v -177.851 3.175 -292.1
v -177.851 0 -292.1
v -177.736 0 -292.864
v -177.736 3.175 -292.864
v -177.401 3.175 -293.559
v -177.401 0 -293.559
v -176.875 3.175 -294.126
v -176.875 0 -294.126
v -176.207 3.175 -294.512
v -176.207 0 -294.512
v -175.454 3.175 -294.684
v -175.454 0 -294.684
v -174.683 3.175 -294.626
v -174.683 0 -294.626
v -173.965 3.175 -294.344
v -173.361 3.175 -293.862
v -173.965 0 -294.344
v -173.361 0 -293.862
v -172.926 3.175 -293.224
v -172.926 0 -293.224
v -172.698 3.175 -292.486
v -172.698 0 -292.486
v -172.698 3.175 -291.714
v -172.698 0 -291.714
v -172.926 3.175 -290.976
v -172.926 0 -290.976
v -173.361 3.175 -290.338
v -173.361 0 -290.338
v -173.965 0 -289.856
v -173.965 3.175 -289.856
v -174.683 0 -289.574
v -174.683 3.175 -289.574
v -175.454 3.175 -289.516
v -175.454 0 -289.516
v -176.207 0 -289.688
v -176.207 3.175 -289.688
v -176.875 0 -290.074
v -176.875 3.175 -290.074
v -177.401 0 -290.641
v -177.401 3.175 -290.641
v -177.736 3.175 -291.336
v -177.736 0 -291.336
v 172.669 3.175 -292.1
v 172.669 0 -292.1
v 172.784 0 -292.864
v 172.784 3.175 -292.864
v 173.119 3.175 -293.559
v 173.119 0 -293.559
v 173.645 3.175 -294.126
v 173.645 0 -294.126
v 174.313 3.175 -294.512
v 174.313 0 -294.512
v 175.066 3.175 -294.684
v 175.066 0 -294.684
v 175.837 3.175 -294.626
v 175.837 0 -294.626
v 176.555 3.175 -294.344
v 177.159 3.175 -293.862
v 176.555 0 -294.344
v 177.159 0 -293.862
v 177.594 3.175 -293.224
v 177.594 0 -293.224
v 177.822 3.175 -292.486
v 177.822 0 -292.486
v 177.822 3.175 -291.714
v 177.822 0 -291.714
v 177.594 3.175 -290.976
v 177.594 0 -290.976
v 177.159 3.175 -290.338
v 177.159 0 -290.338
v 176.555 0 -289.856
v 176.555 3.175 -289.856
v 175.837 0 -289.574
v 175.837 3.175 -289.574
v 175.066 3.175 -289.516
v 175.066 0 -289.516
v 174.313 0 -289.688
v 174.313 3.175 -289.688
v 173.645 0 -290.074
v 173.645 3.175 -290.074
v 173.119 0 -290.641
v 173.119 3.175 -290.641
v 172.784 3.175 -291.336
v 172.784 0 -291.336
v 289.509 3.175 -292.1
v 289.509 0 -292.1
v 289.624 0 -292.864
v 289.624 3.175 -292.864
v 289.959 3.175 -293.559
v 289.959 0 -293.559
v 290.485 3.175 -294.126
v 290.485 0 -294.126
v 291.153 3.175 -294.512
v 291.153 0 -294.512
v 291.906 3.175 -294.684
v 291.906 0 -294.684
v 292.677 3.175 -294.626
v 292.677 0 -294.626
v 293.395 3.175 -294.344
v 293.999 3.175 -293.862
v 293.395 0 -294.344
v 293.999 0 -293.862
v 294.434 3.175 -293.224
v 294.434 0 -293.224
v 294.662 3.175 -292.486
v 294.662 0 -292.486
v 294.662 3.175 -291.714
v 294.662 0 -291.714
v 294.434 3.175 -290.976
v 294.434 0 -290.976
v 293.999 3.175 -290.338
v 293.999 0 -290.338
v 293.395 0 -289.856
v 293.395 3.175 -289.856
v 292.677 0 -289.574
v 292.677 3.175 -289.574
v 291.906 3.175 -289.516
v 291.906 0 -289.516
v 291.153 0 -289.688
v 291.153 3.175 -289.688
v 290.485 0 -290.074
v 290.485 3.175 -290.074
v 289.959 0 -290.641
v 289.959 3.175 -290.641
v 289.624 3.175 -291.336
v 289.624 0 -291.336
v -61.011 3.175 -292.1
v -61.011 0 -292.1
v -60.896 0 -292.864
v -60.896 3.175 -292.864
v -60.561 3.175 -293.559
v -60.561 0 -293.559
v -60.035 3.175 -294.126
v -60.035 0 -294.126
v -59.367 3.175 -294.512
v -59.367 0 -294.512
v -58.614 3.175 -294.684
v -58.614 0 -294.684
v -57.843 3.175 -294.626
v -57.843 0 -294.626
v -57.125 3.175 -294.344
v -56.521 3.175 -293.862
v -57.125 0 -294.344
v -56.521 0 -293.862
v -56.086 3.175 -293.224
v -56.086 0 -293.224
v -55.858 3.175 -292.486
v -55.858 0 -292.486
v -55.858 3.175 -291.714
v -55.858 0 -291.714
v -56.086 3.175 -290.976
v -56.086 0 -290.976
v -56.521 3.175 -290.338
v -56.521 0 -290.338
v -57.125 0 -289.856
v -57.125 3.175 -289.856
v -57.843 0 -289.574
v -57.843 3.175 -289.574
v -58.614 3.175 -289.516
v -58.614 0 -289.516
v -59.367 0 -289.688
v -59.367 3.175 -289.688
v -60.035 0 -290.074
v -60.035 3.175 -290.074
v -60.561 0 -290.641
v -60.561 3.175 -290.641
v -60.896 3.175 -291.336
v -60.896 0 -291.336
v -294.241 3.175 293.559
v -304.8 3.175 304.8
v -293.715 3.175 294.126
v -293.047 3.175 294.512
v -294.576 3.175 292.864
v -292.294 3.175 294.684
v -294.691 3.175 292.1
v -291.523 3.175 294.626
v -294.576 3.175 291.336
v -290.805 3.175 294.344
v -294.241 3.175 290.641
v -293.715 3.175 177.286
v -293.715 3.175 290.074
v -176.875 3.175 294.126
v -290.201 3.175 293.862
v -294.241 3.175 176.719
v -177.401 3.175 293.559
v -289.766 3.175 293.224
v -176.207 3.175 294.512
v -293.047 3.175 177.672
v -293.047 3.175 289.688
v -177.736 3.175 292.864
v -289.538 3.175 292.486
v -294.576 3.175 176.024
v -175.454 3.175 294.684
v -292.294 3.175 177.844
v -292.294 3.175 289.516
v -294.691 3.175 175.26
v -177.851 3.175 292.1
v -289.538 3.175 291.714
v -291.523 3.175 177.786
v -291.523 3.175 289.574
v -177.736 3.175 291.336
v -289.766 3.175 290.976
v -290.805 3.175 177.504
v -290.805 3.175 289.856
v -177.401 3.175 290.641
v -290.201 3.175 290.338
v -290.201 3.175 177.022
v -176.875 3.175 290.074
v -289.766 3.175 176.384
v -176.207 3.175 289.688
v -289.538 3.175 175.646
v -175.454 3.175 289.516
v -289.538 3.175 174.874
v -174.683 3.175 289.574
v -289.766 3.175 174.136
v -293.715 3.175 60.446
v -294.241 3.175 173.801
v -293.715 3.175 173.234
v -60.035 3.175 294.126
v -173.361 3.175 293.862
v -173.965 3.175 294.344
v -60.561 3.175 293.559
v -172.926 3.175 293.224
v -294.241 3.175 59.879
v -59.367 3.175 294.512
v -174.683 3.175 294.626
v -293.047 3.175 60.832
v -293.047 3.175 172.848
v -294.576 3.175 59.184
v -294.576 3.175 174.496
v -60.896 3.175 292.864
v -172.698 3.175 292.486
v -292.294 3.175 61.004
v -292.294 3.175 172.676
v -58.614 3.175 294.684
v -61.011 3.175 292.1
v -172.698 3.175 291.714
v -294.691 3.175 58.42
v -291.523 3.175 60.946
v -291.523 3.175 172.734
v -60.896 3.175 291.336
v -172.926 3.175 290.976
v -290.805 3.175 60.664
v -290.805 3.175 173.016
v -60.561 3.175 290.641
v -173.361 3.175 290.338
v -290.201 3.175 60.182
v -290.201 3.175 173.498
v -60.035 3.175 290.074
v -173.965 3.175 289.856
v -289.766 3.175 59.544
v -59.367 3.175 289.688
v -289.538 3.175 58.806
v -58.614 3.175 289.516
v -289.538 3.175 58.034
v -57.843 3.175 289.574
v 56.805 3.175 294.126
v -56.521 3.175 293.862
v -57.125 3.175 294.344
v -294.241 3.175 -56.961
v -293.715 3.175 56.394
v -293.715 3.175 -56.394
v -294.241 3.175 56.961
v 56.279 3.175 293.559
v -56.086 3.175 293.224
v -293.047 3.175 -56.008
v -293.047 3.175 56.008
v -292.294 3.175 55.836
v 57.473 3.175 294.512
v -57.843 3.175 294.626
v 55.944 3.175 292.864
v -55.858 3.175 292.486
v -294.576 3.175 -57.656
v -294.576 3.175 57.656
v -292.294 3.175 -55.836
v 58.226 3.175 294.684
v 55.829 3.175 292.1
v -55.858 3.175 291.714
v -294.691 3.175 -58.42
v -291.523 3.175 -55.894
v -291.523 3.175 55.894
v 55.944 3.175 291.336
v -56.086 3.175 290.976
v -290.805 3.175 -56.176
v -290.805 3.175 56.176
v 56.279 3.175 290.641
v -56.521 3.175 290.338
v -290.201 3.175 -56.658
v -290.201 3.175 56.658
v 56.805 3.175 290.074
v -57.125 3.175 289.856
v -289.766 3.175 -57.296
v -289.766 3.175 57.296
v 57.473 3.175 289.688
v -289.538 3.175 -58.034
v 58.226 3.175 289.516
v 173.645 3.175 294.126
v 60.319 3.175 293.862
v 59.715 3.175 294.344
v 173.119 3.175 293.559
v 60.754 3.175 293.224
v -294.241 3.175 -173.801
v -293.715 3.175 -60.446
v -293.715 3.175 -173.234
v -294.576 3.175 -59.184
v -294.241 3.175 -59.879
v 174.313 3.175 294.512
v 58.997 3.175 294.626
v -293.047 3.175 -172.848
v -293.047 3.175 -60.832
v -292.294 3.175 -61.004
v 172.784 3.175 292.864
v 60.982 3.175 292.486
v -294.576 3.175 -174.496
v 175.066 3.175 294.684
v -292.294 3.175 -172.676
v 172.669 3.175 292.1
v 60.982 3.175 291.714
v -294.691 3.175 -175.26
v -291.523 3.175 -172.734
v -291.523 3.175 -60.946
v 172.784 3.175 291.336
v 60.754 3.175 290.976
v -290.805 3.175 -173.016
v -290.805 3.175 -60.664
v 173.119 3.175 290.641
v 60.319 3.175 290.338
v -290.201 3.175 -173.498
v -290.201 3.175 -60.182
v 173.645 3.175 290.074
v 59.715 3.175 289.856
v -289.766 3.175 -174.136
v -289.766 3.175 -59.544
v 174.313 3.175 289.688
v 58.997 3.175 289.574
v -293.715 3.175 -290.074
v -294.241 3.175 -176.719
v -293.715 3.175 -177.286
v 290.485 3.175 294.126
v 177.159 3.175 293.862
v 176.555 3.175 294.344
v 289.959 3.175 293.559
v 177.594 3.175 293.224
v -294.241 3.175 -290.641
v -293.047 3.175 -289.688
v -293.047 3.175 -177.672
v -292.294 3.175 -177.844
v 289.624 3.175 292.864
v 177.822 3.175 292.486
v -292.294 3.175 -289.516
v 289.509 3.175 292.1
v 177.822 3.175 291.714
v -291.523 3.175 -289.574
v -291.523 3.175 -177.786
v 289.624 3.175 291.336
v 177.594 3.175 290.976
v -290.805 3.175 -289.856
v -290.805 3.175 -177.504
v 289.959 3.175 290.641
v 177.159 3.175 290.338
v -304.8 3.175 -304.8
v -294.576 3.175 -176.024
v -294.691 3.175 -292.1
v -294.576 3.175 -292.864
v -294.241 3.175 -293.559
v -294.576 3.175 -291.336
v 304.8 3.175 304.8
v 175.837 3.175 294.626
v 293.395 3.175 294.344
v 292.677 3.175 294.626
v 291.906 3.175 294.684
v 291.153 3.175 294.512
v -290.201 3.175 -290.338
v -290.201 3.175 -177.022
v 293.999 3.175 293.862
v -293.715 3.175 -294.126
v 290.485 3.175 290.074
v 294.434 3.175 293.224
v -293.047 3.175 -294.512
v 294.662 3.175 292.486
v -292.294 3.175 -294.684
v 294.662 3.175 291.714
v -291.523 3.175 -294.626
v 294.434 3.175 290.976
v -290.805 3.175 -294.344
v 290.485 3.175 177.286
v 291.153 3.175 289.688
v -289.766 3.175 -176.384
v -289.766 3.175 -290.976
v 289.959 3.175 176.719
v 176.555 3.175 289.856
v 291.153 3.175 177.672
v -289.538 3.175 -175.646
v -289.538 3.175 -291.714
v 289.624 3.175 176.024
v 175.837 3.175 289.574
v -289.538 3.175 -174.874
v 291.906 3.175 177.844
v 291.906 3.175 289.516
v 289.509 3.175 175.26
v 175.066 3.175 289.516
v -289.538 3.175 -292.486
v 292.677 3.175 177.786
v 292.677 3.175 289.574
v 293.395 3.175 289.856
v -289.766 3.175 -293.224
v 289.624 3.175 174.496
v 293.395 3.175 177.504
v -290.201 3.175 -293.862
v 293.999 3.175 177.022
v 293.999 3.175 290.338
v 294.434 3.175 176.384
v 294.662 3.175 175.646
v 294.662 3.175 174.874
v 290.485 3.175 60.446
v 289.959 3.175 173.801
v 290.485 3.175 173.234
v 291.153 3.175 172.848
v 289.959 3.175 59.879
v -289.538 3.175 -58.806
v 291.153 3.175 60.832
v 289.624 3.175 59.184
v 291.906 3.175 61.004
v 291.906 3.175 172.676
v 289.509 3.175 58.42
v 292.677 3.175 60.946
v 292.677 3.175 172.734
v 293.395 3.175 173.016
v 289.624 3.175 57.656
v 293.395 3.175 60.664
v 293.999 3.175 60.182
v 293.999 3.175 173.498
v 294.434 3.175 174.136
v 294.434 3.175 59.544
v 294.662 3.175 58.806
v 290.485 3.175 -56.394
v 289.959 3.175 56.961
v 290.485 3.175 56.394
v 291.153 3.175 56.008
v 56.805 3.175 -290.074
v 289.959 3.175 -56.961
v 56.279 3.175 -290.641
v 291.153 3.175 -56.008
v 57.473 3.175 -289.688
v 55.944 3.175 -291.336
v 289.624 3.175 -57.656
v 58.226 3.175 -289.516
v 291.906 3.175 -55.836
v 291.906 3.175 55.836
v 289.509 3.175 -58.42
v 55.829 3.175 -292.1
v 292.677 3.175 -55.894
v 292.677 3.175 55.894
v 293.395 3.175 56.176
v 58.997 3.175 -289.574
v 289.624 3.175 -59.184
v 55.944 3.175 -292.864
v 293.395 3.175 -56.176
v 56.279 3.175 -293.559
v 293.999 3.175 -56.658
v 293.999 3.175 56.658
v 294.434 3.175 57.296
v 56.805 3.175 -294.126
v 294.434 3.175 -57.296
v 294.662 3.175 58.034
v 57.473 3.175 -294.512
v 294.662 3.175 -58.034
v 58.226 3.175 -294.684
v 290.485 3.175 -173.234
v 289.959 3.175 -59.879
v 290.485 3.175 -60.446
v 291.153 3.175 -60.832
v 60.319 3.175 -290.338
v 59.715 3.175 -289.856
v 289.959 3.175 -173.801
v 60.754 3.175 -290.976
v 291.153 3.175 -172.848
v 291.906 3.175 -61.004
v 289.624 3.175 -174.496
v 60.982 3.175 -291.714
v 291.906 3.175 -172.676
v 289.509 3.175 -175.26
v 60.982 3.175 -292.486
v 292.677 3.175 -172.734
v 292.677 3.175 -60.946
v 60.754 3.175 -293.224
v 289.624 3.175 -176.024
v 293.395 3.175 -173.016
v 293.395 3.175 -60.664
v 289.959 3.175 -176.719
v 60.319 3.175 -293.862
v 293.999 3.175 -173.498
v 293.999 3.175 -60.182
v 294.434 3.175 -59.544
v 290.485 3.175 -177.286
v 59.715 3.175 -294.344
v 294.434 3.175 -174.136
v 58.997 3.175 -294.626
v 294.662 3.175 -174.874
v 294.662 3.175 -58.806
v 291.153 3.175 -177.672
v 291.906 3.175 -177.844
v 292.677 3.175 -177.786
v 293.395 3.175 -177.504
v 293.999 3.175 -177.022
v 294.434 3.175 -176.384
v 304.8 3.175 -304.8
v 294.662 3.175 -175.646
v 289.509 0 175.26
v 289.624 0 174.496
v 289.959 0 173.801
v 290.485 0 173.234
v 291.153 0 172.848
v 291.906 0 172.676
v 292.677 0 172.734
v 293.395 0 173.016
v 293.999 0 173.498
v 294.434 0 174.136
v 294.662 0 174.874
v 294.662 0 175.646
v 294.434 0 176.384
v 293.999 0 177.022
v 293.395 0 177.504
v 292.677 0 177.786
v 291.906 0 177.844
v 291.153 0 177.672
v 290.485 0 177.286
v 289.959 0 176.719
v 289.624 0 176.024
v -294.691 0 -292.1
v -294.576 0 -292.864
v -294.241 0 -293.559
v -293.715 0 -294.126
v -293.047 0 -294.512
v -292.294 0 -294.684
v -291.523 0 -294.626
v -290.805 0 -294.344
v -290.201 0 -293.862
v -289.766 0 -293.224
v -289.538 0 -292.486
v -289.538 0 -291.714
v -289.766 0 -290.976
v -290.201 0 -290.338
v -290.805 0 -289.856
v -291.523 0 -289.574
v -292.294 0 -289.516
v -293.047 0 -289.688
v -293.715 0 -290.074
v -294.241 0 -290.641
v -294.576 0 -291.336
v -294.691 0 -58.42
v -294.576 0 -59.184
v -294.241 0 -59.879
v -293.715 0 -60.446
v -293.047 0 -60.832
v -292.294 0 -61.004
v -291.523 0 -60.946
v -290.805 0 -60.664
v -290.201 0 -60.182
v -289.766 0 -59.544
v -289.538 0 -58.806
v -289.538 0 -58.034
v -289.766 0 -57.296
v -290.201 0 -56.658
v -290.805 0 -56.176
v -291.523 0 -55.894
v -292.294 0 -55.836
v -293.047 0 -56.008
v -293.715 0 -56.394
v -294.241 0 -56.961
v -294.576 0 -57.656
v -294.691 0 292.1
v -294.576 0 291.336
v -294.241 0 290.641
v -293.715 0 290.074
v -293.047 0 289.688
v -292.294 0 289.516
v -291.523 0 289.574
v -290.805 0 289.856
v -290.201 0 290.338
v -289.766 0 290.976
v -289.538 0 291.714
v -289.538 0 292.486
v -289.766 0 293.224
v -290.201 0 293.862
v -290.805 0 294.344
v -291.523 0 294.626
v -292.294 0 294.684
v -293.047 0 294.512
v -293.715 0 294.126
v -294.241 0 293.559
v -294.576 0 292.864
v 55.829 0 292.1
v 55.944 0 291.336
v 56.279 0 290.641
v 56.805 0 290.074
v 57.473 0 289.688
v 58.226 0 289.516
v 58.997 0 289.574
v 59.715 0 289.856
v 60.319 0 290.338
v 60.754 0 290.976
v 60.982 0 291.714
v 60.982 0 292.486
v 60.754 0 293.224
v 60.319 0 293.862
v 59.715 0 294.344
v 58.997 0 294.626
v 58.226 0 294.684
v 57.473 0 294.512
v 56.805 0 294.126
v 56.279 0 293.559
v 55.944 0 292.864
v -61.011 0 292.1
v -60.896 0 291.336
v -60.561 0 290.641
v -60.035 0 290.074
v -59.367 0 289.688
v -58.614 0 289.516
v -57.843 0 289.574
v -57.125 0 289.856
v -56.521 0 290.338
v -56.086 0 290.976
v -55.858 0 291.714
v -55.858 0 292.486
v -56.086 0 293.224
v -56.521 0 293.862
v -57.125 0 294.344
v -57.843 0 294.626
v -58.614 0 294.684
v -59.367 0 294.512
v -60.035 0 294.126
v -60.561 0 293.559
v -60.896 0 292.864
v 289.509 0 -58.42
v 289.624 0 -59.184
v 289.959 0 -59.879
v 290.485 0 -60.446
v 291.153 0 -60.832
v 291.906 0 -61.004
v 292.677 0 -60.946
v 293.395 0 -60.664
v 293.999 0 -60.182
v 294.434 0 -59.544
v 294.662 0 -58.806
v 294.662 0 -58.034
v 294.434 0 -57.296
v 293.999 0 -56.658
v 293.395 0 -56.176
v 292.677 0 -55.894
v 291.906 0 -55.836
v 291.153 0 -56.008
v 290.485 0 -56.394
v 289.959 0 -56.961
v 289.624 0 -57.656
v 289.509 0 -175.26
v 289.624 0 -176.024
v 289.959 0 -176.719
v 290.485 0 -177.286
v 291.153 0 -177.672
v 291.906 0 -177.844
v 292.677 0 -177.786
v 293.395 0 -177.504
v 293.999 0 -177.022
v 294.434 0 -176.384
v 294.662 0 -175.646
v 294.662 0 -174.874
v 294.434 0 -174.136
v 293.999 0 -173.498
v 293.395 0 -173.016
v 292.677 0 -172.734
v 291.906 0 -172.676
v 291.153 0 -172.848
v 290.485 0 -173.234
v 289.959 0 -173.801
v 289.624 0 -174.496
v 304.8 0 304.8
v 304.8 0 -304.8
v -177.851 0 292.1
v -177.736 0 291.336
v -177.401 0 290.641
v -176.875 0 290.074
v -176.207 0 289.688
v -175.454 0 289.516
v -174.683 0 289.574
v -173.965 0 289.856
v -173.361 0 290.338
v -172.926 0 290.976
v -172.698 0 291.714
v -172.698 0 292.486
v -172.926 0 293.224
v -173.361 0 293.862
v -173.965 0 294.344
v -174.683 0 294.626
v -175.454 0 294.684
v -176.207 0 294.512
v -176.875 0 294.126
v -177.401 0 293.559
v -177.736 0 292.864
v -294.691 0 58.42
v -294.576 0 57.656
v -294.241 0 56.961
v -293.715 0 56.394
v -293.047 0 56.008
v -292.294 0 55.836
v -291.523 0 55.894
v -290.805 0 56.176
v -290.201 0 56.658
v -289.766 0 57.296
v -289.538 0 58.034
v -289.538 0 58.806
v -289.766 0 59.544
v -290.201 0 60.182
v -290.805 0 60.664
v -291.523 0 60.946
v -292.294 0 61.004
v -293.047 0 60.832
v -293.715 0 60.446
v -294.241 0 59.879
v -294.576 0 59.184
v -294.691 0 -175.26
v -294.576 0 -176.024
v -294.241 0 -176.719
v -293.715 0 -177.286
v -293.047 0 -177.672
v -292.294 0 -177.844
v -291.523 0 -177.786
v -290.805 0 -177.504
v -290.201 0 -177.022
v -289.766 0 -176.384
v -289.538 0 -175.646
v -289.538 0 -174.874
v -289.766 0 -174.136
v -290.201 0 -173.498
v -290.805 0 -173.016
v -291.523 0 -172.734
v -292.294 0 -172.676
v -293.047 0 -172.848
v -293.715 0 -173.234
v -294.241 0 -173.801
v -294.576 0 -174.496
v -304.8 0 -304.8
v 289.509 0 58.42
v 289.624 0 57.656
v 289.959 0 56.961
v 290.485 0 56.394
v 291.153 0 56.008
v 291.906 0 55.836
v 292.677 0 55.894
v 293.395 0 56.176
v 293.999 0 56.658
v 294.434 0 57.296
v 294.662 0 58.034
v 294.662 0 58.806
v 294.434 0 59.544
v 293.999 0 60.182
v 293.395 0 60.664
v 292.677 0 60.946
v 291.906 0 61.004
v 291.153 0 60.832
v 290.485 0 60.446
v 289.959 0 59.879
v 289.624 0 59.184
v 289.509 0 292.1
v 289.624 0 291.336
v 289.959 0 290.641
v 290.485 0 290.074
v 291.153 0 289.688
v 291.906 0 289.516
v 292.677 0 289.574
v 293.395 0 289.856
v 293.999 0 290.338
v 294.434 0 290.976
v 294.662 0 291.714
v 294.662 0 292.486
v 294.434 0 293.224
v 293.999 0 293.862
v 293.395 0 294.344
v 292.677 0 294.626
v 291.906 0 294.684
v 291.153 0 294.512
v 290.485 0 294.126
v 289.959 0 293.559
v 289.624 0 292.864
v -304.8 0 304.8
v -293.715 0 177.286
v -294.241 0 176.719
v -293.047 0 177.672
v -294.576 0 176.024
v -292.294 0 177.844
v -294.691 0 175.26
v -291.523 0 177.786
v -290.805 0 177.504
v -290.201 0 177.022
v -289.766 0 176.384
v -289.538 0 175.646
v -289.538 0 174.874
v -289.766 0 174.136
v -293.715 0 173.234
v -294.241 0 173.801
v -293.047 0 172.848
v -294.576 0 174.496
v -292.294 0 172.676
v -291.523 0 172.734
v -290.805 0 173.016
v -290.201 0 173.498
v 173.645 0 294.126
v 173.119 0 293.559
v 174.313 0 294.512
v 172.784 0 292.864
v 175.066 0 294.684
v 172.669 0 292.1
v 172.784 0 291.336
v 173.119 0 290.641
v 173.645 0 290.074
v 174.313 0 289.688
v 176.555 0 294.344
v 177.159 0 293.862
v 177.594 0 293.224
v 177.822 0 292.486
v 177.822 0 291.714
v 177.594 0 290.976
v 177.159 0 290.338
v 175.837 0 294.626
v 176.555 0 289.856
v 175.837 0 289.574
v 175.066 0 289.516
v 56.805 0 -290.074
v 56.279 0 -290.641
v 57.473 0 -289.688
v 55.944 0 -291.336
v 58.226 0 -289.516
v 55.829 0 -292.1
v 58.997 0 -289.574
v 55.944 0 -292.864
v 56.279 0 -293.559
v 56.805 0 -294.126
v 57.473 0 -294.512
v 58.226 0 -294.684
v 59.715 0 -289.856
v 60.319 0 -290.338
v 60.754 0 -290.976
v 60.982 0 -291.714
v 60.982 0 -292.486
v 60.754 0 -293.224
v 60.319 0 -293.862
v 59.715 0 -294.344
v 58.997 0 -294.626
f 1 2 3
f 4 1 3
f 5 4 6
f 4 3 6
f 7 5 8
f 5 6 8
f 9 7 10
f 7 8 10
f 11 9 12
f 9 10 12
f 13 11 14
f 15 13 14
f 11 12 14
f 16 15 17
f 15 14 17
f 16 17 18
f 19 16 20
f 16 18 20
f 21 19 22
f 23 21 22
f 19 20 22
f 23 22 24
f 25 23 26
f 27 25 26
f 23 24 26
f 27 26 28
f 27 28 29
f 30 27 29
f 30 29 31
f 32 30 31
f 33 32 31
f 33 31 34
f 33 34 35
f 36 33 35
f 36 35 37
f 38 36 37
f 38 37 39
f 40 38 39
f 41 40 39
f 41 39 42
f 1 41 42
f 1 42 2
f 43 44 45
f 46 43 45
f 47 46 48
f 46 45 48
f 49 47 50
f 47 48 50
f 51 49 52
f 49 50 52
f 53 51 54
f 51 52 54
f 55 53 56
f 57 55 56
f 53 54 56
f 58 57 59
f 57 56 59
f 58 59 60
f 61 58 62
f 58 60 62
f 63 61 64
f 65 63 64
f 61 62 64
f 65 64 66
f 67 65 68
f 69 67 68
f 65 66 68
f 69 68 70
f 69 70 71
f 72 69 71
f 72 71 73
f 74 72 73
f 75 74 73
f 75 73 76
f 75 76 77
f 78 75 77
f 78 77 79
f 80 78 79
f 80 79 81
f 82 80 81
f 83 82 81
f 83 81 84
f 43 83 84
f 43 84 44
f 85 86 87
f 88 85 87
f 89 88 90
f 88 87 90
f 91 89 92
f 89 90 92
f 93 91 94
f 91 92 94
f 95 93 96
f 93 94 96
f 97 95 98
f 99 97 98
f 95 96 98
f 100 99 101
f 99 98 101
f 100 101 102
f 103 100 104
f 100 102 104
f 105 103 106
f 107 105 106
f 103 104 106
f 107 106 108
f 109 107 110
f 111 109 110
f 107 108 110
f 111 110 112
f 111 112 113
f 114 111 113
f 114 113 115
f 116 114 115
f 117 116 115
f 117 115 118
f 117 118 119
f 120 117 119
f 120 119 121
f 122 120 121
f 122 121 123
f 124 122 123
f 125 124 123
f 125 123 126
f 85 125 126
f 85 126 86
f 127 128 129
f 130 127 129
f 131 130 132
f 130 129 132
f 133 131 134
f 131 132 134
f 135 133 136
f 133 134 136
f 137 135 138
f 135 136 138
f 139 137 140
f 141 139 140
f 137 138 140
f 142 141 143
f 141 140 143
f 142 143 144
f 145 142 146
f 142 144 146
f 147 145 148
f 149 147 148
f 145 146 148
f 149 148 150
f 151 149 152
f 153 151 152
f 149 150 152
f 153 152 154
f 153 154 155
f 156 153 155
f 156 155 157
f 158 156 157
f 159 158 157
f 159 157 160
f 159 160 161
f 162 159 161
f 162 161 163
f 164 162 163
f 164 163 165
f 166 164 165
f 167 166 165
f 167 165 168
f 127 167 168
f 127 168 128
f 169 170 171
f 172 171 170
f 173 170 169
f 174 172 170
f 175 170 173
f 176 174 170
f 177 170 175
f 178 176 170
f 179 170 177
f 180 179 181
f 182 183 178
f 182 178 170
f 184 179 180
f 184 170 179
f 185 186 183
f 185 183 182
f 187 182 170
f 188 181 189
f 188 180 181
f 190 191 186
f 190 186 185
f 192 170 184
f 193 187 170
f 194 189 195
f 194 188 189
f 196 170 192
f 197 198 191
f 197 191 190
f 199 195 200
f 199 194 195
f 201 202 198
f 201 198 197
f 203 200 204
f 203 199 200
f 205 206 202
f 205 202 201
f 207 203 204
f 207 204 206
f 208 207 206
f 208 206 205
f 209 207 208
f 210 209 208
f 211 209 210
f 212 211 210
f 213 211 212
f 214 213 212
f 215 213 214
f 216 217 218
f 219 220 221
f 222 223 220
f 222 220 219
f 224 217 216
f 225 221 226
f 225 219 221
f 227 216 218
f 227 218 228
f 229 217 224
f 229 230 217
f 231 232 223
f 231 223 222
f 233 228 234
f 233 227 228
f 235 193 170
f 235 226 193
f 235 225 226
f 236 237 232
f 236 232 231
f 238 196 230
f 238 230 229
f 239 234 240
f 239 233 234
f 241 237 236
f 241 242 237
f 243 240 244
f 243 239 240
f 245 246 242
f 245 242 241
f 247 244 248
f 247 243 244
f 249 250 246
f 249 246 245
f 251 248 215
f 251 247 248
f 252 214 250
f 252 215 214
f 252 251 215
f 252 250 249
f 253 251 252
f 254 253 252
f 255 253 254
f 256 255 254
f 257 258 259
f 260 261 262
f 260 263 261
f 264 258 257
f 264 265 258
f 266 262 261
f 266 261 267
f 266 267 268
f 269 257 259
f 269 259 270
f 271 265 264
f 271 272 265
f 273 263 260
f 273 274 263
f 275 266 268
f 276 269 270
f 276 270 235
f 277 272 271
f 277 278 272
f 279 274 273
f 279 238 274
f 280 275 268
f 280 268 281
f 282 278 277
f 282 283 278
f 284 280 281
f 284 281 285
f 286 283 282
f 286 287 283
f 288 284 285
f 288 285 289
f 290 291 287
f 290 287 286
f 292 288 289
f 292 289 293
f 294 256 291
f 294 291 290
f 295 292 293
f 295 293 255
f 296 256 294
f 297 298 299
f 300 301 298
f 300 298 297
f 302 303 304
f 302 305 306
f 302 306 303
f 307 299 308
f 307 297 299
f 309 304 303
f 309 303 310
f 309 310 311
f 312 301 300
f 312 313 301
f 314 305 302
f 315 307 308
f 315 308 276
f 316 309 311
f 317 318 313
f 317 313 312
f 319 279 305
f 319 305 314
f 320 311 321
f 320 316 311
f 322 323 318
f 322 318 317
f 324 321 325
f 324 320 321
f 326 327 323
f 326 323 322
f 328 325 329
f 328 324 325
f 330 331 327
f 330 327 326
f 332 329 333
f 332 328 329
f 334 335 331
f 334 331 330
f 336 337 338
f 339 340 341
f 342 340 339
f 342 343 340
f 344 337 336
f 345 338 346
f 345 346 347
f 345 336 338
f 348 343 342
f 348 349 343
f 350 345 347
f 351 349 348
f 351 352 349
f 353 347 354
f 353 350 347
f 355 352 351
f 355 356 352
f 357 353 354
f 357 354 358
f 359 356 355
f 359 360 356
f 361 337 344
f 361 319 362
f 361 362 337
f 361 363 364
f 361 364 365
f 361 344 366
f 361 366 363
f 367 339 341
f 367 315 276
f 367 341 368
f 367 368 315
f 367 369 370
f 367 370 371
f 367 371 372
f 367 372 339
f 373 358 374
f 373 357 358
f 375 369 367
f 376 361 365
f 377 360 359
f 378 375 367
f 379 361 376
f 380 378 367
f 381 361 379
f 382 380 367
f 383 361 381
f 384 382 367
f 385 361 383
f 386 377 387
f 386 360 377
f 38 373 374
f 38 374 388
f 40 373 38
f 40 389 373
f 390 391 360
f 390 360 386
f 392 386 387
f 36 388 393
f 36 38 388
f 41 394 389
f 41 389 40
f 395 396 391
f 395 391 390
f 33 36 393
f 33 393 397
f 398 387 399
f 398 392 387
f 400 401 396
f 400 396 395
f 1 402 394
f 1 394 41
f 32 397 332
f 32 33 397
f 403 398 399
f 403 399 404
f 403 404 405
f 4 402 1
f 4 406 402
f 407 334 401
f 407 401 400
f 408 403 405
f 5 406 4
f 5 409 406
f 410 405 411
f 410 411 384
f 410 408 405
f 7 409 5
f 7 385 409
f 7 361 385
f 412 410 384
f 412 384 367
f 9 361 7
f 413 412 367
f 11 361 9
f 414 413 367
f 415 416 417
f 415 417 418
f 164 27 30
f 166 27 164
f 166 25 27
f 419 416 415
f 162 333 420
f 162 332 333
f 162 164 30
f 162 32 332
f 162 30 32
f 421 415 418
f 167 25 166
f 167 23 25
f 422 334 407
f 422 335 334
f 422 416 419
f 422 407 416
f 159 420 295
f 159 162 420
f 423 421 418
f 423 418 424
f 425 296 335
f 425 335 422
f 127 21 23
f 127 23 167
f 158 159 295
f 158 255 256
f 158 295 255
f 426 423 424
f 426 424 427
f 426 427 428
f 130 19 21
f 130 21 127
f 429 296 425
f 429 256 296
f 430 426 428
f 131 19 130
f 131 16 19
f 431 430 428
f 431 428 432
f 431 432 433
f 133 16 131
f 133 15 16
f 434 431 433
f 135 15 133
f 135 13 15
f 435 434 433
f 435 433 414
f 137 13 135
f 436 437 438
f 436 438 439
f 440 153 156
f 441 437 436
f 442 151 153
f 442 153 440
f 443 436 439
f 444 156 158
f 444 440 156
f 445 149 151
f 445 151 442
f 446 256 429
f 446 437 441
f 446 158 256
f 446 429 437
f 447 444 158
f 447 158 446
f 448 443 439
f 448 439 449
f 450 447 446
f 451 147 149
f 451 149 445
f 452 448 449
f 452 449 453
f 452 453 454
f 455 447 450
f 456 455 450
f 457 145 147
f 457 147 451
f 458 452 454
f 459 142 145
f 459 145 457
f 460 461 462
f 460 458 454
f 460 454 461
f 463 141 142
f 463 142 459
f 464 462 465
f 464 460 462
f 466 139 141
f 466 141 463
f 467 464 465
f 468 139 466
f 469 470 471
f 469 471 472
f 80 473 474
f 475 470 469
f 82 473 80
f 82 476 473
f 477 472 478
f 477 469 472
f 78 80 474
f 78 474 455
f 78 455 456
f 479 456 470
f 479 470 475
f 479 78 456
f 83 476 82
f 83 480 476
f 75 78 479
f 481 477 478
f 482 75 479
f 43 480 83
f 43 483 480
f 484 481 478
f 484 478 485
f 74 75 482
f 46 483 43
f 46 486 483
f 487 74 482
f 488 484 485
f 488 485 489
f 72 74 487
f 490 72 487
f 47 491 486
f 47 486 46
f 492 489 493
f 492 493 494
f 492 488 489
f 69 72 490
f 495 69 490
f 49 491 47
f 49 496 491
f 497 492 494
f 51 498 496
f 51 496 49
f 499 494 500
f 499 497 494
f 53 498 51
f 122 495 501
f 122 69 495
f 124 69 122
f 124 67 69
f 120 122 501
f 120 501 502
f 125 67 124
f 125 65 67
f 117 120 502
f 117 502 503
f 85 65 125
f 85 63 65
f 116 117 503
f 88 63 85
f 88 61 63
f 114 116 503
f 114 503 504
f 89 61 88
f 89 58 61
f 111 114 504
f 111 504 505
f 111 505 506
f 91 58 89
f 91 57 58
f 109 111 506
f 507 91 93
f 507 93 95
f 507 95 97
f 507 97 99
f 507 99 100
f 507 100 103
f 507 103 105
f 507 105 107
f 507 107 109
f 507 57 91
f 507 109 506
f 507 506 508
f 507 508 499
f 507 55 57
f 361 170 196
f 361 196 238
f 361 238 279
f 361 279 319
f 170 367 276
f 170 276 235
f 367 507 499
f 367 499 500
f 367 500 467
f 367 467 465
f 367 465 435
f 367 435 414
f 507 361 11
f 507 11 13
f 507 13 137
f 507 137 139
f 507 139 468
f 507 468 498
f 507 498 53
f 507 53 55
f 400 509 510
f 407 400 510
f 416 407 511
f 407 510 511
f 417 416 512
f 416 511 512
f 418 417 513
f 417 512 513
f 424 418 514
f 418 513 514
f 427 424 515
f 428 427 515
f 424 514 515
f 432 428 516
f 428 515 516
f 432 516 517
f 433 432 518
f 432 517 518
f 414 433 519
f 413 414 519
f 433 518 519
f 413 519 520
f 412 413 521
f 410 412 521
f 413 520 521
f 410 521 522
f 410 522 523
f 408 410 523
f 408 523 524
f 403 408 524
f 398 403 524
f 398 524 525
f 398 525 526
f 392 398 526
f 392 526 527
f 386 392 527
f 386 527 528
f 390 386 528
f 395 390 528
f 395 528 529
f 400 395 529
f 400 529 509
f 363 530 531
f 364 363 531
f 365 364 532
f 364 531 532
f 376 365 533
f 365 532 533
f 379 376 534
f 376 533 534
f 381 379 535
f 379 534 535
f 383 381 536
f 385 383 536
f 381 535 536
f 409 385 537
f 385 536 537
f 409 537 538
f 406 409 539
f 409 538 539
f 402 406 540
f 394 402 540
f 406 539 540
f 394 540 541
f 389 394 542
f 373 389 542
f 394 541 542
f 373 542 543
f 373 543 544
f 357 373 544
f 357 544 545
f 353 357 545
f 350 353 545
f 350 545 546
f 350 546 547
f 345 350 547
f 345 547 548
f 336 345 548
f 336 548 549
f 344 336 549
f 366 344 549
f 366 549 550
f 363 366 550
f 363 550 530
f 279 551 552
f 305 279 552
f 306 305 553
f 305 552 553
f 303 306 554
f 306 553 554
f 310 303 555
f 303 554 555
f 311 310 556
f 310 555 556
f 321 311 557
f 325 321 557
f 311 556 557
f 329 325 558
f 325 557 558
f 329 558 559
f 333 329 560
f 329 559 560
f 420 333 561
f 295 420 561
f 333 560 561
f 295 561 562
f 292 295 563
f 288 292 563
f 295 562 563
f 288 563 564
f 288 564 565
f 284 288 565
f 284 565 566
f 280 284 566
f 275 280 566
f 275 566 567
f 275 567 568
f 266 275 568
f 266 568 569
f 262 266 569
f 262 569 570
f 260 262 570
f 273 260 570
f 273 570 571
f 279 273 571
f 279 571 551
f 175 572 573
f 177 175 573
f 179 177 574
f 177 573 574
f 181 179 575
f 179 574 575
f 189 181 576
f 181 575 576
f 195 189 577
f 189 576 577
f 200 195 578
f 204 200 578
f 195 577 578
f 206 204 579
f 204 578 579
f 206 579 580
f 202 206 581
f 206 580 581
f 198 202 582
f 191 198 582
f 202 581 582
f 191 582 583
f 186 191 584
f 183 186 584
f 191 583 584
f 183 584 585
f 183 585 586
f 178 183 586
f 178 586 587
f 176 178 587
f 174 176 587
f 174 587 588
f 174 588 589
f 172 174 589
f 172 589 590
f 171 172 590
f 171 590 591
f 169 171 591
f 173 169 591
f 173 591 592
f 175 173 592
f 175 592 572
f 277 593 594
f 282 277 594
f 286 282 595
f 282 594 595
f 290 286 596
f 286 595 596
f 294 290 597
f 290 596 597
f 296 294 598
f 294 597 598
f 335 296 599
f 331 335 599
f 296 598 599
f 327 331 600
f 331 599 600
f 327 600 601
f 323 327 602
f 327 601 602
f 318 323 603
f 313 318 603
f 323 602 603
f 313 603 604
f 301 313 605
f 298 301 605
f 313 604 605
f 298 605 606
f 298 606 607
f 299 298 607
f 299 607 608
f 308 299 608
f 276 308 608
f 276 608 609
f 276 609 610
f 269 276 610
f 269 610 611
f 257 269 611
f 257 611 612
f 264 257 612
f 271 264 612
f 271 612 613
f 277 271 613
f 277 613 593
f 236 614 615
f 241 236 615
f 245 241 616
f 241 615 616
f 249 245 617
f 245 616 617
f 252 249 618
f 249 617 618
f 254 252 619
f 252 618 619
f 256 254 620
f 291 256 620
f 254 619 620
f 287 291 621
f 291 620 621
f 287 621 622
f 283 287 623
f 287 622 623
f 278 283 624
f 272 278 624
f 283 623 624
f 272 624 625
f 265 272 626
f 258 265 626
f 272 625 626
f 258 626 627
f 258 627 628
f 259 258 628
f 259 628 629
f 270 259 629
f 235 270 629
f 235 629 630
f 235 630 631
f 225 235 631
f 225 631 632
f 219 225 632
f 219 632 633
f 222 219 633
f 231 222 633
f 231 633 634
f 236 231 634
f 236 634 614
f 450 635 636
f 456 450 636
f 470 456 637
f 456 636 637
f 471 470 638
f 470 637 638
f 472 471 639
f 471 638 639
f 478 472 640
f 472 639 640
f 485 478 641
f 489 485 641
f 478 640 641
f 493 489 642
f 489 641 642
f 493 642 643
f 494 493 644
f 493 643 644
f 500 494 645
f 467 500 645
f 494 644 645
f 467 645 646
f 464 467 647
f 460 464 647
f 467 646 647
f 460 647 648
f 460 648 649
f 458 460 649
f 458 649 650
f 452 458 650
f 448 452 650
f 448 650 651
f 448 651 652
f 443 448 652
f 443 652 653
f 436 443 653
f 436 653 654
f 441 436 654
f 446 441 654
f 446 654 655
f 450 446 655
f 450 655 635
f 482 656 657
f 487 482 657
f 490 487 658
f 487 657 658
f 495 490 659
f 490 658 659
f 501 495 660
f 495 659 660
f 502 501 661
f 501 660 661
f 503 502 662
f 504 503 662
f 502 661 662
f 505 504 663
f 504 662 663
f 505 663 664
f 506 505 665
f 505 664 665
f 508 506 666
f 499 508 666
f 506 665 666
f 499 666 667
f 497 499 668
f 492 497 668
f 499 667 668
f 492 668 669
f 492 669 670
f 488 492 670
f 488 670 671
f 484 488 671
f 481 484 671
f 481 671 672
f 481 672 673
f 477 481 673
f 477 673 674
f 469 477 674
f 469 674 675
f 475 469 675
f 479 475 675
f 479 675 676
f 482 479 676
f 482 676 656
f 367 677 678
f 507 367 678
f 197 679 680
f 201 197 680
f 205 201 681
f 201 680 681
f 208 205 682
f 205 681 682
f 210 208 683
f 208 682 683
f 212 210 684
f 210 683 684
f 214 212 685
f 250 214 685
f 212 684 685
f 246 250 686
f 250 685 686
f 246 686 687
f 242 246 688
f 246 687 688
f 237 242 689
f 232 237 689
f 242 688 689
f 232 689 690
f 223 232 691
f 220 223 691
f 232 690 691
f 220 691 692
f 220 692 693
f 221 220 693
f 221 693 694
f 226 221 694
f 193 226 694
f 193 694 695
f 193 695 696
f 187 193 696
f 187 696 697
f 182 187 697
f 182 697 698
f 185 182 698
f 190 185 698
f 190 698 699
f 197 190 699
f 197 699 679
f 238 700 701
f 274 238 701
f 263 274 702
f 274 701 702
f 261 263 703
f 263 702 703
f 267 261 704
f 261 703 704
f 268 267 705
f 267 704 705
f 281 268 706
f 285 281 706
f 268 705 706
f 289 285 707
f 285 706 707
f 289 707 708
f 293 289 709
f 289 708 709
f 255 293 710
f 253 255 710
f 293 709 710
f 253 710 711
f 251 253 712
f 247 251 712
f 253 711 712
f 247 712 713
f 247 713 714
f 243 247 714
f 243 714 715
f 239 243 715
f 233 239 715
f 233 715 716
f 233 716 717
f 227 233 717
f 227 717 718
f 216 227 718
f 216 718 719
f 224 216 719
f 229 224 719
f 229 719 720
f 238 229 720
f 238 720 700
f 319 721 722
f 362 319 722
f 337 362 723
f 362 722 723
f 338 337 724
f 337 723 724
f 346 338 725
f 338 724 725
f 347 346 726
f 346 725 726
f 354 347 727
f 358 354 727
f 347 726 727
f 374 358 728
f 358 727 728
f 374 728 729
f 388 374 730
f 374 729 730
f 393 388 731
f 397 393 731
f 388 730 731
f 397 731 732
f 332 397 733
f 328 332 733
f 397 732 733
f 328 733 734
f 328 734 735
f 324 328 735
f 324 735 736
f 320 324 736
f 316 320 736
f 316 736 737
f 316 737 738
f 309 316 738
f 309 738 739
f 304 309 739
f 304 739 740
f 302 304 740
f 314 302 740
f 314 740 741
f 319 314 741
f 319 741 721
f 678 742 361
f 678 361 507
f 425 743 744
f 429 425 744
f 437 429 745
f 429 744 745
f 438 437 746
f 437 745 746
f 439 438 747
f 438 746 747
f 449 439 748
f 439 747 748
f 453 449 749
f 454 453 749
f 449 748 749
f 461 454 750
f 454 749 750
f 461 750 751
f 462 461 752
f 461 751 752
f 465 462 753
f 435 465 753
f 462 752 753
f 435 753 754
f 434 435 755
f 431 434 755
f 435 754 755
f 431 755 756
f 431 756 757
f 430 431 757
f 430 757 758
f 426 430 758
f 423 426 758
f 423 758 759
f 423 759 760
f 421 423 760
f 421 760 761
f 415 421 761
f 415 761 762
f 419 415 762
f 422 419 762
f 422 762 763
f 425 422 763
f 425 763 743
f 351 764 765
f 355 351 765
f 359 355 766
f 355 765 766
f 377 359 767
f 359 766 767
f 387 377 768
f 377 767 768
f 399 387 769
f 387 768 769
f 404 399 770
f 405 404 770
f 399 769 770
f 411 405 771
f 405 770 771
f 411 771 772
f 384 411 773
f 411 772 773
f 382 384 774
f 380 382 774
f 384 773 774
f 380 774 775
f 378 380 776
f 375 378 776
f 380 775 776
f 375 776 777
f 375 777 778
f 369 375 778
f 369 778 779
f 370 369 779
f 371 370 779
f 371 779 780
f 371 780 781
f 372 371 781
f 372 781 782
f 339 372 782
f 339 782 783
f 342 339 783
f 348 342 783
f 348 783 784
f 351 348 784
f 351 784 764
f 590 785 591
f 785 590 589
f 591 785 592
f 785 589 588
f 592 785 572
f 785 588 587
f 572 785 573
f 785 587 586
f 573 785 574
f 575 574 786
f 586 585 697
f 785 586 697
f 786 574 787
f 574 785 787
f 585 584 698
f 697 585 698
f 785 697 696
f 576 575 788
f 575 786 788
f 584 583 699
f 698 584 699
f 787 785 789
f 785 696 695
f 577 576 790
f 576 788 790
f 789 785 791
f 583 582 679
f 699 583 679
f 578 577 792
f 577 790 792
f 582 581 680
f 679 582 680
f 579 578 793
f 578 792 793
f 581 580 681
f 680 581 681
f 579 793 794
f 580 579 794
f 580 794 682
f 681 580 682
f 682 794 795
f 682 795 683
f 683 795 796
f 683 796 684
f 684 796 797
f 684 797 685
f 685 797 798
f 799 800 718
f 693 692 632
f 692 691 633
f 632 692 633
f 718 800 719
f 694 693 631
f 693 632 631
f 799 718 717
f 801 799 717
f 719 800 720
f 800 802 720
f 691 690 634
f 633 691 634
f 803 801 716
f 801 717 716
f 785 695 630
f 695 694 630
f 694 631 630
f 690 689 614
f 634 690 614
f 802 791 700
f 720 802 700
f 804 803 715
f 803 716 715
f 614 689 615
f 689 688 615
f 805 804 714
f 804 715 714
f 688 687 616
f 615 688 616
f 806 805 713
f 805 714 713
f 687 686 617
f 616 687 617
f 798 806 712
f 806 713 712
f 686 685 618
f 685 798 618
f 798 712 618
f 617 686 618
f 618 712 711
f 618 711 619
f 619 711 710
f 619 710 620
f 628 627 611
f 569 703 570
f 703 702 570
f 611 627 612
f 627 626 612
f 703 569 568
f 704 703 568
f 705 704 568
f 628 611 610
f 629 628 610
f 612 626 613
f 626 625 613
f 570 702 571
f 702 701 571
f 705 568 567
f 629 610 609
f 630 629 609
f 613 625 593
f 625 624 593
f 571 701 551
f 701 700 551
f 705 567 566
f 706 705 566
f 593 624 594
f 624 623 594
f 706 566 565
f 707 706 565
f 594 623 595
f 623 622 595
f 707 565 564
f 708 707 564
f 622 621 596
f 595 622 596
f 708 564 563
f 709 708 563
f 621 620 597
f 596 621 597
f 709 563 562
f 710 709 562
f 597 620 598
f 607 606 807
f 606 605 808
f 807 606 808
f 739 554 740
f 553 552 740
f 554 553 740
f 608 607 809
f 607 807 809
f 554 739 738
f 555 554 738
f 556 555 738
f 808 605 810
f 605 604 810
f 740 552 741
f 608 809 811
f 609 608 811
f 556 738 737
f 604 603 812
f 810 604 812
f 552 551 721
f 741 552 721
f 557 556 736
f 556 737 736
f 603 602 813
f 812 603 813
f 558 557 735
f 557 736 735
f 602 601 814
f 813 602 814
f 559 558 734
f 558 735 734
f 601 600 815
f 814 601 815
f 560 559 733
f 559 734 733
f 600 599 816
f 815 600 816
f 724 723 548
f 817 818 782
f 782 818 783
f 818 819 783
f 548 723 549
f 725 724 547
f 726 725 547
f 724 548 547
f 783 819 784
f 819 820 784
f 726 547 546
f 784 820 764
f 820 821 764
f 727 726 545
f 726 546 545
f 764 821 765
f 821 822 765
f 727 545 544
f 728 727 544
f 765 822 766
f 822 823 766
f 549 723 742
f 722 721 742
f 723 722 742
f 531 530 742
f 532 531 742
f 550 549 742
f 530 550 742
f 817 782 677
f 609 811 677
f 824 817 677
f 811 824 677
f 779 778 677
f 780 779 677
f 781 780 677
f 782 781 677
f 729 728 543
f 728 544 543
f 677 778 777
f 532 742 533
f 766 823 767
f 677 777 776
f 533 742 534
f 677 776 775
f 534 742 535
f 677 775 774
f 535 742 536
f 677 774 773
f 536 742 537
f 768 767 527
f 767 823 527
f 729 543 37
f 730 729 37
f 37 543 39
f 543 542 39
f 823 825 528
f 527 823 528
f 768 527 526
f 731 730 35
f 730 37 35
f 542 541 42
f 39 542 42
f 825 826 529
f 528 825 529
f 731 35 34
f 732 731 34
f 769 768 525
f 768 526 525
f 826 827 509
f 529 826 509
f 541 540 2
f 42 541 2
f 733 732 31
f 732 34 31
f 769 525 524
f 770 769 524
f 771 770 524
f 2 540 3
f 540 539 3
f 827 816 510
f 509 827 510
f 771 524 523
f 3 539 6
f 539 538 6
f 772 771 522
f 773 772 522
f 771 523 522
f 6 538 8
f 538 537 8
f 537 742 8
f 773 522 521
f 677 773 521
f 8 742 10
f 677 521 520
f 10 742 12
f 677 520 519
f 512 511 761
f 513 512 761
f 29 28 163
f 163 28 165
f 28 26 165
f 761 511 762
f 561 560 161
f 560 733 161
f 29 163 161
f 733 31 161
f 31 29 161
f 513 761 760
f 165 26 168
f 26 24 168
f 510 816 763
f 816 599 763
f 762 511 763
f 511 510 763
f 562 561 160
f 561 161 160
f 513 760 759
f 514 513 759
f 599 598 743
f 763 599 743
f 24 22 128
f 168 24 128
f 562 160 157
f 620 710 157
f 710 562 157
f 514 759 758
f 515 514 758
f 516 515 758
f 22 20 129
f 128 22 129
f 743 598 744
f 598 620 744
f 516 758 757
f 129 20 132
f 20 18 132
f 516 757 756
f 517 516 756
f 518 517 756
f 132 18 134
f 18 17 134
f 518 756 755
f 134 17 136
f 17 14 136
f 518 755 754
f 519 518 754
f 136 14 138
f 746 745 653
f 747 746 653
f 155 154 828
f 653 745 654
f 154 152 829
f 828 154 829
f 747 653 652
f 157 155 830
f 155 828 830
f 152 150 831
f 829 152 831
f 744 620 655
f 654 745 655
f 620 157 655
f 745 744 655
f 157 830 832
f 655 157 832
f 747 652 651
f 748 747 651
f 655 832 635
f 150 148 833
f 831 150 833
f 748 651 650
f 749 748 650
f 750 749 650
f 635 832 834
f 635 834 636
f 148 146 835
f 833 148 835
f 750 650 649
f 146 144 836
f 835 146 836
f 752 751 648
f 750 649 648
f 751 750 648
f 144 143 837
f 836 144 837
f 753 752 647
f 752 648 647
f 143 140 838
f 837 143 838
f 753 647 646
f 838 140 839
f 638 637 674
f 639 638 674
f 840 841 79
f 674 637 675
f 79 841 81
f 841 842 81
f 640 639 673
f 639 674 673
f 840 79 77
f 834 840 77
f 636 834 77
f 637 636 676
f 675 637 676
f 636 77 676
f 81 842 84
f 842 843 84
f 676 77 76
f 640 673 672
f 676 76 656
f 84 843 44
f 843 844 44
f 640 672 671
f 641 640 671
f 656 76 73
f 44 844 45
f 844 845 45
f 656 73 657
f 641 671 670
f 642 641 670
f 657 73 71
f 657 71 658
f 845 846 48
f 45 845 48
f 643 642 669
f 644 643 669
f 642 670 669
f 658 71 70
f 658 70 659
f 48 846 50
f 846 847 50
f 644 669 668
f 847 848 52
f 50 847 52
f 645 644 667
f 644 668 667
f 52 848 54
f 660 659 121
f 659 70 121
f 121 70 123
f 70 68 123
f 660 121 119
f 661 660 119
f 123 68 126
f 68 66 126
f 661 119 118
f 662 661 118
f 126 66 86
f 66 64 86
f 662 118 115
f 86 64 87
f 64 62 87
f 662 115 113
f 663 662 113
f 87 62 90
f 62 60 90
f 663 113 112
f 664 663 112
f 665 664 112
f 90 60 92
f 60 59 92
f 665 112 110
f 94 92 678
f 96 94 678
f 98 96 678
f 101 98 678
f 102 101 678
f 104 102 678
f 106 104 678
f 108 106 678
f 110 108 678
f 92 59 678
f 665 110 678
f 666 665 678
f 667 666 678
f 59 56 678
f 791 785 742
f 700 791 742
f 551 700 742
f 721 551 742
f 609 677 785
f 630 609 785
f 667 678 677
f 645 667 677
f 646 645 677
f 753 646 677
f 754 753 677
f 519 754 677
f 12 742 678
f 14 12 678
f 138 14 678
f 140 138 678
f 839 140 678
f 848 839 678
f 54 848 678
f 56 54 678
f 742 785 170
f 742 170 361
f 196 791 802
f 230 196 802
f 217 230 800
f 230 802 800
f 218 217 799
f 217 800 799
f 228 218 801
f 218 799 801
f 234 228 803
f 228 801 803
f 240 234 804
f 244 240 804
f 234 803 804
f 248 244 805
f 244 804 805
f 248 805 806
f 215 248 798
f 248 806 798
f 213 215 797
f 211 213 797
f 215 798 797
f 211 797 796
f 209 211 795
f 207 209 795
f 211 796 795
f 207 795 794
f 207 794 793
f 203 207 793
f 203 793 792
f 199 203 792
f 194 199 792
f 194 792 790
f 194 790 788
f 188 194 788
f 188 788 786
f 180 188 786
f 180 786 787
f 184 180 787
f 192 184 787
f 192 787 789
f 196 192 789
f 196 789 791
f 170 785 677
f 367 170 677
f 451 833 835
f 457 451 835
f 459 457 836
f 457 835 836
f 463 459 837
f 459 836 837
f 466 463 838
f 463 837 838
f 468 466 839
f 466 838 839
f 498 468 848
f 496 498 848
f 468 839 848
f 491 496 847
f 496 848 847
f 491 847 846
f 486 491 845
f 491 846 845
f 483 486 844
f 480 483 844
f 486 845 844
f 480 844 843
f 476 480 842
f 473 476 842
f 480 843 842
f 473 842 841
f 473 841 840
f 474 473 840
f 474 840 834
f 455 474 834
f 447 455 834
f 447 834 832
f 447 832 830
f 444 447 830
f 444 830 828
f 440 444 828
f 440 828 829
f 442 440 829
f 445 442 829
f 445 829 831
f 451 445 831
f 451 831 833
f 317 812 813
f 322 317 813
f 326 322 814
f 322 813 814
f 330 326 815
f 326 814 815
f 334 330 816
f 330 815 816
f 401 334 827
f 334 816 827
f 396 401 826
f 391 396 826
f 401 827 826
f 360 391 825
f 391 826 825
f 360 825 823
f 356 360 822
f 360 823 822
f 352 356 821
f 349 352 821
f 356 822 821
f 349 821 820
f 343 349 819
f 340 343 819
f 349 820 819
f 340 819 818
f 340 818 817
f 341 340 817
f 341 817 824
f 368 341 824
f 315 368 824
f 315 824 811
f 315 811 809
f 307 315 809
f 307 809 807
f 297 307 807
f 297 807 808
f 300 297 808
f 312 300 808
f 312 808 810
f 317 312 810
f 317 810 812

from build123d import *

# Parameters (mm, degrees)
SKETCH1_W                  = 609.6
SKETCH1_H                  = 609.6
BOSS_EXTRUDE1_DEPTH        = 3.175
F_6_0_204_DIAMETER_HOLE1_D = 5.1816


with BuildPart() as part:
    # Sketch1 → Boss-Extrude1 (new body)
    with BuildSketch(Plane(origin=(0, 0, 0), x_dir=(1, 0, 0), z_dir=(0, 1, 0))):
        Rectangle(SKETCH1_W, SKETCH1_H)
    extrude(amount=BOSS_EXTRUDE1_DEPTH)

    # #6 (0.204) Diameter Hole1 (through all)
    with Locations(Plane(origin=(0, 3.175, 0), x_dir=(1, 0, 0), z_dir=(0, 1, 0))):
        with Locations((-292.1, 292.1), (-175.26, 292.1), (-58.42, 292.1), (58.42, 292.1), (175.26, 292.1), (-292.1, 175.26), (-292.1, 58.42), (-292.1, -58.42), (-292.1, -175.26), (175.26, -292.1), (58.42, -292.1), (-58.42, -292.1), (-175.26, -292.1), (-292.1, -292.1), (292.1, -292.1), (292.1, -175.26), (292.1, -58.42), (292.1, 58.42), (292.1, 175.26), (292.1, 292.1)):
            Hole(F_6_0_204_DIAMETER_HOLE1_D / 2)


solid = part.part
